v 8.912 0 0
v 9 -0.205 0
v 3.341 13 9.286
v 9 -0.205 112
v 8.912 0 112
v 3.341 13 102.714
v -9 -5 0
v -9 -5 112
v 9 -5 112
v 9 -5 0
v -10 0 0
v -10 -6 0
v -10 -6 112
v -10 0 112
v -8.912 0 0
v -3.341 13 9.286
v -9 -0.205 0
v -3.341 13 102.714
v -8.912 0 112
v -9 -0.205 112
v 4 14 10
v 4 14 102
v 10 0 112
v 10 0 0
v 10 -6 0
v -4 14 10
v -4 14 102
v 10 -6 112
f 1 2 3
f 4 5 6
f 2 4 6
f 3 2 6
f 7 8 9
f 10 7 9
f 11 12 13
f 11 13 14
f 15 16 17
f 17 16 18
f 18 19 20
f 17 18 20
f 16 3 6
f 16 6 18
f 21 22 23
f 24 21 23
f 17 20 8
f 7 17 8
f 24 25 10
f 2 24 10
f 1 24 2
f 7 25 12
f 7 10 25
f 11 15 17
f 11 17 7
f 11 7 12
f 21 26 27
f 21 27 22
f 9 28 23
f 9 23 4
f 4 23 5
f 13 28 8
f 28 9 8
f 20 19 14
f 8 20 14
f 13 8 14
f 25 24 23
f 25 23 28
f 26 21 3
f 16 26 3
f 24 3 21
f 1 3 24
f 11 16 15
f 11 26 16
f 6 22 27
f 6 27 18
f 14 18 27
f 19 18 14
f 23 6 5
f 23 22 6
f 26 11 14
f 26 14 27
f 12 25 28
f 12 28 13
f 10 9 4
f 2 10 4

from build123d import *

# Parameters (mm, degrees)
BOSS_EXTRUDE1_DEPTH = 112
CUT_EXTRUDE1_DEPTH  = 113
CUT_EXTRUDE2_DEPTH  = 21
CUT_EXTRUDE3_DEPTH  = 21


with BuildPart() as part:
    # Sketch1 → Boss-Extrude1 (new body)
    with BuildSketch(Plane.XY):
        Polygon((-4, 14), (4, 14), (10, 0), (10, -6), (-10, -6), (-10, 0), align=None)
    extrude(amount=BOSS_EXTRUDE1_DEPTH)

    # Sketch2 → Cut-Extrude1 (cut, through all)
    with BuildSketch(Plane.XY.offset(112)):
        Polygon((-3.340603842, 13), (-9, -0.205257702), (-9, -5), (9, -5), (9, -0.205257702), (3.340603842, 13), align=None)
    extrude(amount=-CUT_EXTRUDE1_DEPTH, mode=Mode.SUBTRACT)

    # Sketch4 → Cut-Extrude2 (cut, through all)
    with BuildSketch(Plane(origin=(10, 0, 0), x_dir=(0, 0, -1), z_dir=(1, 0, 0))):
        Polygon((-112, 14), (-102, 14), (-112, 0), align=None)
    extrude(amount=-CUT_EXTRUDE2_DEPTH, mode=Mode.SUBTRACT)

    # Sketch5 → Cut-Extrude3 (cut, through all)
    with BuildSketch(Plane.ZY.offset(10)):
        Polygon((0, 14), (10, 14), (0, 0), align=None)
    extrude(amount=-CUT_EXTRUDE3_DEPTH, mode=Mode.SUBTRACT)


solid = part.part
